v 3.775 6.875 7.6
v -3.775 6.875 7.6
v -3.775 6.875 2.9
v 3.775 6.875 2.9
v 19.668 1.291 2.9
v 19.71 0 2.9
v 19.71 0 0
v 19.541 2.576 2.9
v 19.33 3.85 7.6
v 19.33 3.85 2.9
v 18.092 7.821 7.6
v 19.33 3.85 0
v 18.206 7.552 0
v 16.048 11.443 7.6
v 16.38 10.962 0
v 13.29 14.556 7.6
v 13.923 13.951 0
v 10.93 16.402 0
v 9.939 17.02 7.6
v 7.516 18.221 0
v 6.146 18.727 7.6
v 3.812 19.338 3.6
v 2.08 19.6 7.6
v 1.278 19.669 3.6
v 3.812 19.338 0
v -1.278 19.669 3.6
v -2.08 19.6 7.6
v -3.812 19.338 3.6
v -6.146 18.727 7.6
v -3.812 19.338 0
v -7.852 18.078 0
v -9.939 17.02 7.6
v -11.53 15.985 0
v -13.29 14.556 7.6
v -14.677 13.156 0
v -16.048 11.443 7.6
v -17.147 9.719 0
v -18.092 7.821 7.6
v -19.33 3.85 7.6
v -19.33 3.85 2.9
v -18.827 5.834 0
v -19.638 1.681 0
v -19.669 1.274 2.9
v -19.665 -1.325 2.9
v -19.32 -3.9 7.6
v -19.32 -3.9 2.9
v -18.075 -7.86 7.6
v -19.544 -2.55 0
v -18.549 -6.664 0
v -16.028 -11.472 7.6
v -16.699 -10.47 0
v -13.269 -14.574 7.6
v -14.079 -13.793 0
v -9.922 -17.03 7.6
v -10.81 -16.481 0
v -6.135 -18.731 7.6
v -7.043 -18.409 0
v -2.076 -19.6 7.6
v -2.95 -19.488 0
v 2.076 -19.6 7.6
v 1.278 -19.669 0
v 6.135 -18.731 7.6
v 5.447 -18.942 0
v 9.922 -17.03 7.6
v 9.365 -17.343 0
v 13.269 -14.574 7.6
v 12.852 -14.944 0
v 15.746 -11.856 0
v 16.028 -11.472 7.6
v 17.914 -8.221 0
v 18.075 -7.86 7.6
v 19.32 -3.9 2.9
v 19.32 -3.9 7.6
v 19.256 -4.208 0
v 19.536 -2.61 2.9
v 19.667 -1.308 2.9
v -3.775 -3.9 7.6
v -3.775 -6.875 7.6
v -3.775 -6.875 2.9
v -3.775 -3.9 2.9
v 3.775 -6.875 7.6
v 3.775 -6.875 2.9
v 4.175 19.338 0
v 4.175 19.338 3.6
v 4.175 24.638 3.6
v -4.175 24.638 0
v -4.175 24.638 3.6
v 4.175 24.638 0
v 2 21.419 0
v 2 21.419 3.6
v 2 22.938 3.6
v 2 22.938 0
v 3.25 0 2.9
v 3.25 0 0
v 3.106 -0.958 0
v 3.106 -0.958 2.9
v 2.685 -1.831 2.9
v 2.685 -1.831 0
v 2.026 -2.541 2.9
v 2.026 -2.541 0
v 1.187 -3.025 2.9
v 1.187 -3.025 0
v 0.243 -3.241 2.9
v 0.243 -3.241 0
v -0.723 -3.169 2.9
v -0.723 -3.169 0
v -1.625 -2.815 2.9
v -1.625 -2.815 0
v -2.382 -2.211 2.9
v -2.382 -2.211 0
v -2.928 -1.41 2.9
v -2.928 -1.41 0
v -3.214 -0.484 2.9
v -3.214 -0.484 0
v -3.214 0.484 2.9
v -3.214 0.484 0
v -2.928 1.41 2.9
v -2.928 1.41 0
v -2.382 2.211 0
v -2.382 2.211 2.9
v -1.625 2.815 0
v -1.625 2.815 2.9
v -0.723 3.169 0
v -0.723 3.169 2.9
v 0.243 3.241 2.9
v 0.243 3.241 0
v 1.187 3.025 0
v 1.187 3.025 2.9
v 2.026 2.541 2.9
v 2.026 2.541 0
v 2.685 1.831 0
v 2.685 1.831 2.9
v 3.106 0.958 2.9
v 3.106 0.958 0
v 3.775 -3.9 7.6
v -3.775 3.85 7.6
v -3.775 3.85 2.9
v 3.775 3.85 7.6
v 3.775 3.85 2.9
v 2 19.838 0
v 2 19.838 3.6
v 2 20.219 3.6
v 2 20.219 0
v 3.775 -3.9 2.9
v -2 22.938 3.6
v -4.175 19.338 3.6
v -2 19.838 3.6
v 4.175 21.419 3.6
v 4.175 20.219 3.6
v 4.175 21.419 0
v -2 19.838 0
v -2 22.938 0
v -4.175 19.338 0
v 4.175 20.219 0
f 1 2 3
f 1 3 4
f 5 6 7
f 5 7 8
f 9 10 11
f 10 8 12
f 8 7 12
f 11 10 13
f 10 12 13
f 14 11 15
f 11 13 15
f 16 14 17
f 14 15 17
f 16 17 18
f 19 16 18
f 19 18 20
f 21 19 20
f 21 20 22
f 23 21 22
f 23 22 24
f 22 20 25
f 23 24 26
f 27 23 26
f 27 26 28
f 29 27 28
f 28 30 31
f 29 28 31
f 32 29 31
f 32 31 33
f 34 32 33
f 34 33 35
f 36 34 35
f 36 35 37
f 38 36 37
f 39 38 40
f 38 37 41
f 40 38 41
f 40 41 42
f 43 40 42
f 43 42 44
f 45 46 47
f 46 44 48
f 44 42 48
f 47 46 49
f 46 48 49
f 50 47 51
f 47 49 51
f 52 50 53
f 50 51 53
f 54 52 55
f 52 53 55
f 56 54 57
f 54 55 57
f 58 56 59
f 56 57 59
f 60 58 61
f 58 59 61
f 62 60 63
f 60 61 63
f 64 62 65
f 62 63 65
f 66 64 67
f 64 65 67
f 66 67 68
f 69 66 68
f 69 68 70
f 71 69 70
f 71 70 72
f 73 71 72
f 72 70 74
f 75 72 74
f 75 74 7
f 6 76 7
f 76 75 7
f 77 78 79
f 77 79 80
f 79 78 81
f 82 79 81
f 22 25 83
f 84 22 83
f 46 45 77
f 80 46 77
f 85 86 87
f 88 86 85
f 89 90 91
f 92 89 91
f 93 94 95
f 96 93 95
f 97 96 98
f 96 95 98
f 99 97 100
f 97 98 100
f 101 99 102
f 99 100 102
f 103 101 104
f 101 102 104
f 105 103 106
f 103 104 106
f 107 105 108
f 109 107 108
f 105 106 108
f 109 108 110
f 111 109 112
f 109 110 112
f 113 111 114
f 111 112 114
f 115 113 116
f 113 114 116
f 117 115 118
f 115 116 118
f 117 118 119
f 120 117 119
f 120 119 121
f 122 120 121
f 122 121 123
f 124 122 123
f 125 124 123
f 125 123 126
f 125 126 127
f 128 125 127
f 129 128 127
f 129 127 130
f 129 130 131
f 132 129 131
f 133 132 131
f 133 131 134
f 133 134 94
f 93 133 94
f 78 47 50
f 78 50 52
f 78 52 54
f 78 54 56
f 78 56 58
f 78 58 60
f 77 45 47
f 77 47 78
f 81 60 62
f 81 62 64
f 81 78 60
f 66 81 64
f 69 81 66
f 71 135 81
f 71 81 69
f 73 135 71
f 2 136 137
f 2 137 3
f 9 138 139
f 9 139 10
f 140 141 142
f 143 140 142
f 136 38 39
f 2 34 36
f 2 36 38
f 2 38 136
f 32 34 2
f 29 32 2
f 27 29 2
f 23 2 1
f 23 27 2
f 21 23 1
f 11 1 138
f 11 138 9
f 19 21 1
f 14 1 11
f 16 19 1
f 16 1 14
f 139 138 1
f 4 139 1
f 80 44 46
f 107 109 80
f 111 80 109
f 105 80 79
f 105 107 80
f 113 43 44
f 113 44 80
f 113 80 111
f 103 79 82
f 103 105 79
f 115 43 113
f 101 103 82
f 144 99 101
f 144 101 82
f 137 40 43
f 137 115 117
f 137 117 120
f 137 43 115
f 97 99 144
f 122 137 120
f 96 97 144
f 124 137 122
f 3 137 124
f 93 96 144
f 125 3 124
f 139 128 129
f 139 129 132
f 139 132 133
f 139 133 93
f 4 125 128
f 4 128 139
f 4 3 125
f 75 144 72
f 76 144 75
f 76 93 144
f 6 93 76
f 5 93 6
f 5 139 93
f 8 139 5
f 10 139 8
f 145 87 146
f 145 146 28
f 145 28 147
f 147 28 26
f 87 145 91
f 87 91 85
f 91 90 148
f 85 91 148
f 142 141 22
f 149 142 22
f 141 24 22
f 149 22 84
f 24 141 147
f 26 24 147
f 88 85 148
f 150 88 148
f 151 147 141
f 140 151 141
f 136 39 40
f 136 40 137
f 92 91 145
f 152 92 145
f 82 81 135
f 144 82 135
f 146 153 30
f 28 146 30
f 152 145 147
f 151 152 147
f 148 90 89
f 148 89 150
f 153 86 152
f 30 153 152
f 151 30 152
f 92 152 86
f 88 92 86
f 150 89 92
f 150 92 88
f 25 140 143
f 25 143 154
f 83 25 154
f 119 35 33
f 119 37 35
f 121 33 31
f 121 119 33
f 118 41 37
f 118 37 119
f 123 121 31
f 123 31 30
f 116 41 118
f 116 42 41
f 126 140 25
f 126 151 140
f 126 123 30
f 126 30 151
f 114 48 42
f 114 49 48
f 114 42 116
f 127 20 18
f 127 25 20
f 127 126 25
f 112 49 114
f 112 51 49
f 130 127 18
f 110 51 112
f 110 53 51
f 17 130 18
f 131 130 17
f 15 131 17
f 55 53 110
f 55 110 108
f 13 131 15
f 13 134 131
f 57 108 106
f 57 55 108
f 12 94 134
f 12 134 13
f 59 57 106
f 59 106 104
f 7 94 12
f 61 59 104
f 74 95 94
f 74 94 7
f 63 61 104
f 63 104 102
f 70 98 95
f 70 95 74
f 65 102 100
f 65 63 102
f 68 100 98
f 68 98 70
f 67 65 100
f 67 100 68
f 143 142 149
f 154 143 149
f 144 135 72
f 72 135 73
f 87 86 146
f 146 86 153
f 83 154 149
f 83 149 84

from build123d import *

# Parameters (mm, degrees)
F0_R      = 19.71
F1_DEPTH  = 7.6
F2_W      = 40
F2_H      = 7.75
F3_DEPTH  = 4.7
F4_W      = 7.55
F4_H      = 13.75
F5_DEPTH  = 4.7
F6_W      = 8.35
F6_H      = 5.3
F7_DEPTH  = 3.6
F8_W      = 2.175
F8_H      = 1.2
F9_DEPTH  = 3.601
F10_R     = 3.25
F11_DEPTH = 3


with BuildPart() as f1:
    # F0 (on Top) → F1 (new body)
    with BuildSketch(Plane.XY):
        Circle(F0_R)
    extrude(amount=F1_DEPTH)

    # F2 (on face) → F3 (cut)
    with BuildSketch(Plane.XY.offset(7.6)):
        with Locations((0, -0.025)):
            Rectangle(F2_W, F2_H)
    extrude(amount=-F3_DEPTH, mode=Mode.SUBTRACT)

    # F4 (on face) → F5 (cut)
    with BuildSketch(Plane.XY.offset(7.6)):
        Rectangle(F4_W, F4_H)
    extrude(amount=-F5_DEPTH, mode=Mode.SUBTRACT)

    # F6 (on face) → F7 (join)
    with BuildSketch(Plane(origin=(0, 0, 0), x_dir=(1, 0, 0), z_dir=(0, 0, -1))):
        with Locations((0, -21.987913)):
            Rectangle(F6_W, F6_H)
    extrude(amount=-F7_DEPTH)

    # F8 (on face) → F9 (cut, through all)
    with BuildSketch(Plane.XY.offset(3.6)):
        Polygon((2, 22.937913), (-2, 22.937913), (-2, 19.837913), (2, 19.837913), (2, 20.219285), (2, 21.419285), align=None)
        with Locations((3.0875, 20.819285)):
            Rectangle(F8_W, F8_H)
    extrude(amount=-F9_DEPTH, mode=Mode.SUBTRACT)

    # F10 (on face) → F11 (cut)
    with BuildSketch(Plane(origin=(0, 0, 0), x_dir=(1, 0, 0), z_dir=(0, 0, -1))):
        Circle(F10_R)
    extrude(amount=-F11_DEPTH, mode=Mode.SUBTRACT)


solid = f1.part
